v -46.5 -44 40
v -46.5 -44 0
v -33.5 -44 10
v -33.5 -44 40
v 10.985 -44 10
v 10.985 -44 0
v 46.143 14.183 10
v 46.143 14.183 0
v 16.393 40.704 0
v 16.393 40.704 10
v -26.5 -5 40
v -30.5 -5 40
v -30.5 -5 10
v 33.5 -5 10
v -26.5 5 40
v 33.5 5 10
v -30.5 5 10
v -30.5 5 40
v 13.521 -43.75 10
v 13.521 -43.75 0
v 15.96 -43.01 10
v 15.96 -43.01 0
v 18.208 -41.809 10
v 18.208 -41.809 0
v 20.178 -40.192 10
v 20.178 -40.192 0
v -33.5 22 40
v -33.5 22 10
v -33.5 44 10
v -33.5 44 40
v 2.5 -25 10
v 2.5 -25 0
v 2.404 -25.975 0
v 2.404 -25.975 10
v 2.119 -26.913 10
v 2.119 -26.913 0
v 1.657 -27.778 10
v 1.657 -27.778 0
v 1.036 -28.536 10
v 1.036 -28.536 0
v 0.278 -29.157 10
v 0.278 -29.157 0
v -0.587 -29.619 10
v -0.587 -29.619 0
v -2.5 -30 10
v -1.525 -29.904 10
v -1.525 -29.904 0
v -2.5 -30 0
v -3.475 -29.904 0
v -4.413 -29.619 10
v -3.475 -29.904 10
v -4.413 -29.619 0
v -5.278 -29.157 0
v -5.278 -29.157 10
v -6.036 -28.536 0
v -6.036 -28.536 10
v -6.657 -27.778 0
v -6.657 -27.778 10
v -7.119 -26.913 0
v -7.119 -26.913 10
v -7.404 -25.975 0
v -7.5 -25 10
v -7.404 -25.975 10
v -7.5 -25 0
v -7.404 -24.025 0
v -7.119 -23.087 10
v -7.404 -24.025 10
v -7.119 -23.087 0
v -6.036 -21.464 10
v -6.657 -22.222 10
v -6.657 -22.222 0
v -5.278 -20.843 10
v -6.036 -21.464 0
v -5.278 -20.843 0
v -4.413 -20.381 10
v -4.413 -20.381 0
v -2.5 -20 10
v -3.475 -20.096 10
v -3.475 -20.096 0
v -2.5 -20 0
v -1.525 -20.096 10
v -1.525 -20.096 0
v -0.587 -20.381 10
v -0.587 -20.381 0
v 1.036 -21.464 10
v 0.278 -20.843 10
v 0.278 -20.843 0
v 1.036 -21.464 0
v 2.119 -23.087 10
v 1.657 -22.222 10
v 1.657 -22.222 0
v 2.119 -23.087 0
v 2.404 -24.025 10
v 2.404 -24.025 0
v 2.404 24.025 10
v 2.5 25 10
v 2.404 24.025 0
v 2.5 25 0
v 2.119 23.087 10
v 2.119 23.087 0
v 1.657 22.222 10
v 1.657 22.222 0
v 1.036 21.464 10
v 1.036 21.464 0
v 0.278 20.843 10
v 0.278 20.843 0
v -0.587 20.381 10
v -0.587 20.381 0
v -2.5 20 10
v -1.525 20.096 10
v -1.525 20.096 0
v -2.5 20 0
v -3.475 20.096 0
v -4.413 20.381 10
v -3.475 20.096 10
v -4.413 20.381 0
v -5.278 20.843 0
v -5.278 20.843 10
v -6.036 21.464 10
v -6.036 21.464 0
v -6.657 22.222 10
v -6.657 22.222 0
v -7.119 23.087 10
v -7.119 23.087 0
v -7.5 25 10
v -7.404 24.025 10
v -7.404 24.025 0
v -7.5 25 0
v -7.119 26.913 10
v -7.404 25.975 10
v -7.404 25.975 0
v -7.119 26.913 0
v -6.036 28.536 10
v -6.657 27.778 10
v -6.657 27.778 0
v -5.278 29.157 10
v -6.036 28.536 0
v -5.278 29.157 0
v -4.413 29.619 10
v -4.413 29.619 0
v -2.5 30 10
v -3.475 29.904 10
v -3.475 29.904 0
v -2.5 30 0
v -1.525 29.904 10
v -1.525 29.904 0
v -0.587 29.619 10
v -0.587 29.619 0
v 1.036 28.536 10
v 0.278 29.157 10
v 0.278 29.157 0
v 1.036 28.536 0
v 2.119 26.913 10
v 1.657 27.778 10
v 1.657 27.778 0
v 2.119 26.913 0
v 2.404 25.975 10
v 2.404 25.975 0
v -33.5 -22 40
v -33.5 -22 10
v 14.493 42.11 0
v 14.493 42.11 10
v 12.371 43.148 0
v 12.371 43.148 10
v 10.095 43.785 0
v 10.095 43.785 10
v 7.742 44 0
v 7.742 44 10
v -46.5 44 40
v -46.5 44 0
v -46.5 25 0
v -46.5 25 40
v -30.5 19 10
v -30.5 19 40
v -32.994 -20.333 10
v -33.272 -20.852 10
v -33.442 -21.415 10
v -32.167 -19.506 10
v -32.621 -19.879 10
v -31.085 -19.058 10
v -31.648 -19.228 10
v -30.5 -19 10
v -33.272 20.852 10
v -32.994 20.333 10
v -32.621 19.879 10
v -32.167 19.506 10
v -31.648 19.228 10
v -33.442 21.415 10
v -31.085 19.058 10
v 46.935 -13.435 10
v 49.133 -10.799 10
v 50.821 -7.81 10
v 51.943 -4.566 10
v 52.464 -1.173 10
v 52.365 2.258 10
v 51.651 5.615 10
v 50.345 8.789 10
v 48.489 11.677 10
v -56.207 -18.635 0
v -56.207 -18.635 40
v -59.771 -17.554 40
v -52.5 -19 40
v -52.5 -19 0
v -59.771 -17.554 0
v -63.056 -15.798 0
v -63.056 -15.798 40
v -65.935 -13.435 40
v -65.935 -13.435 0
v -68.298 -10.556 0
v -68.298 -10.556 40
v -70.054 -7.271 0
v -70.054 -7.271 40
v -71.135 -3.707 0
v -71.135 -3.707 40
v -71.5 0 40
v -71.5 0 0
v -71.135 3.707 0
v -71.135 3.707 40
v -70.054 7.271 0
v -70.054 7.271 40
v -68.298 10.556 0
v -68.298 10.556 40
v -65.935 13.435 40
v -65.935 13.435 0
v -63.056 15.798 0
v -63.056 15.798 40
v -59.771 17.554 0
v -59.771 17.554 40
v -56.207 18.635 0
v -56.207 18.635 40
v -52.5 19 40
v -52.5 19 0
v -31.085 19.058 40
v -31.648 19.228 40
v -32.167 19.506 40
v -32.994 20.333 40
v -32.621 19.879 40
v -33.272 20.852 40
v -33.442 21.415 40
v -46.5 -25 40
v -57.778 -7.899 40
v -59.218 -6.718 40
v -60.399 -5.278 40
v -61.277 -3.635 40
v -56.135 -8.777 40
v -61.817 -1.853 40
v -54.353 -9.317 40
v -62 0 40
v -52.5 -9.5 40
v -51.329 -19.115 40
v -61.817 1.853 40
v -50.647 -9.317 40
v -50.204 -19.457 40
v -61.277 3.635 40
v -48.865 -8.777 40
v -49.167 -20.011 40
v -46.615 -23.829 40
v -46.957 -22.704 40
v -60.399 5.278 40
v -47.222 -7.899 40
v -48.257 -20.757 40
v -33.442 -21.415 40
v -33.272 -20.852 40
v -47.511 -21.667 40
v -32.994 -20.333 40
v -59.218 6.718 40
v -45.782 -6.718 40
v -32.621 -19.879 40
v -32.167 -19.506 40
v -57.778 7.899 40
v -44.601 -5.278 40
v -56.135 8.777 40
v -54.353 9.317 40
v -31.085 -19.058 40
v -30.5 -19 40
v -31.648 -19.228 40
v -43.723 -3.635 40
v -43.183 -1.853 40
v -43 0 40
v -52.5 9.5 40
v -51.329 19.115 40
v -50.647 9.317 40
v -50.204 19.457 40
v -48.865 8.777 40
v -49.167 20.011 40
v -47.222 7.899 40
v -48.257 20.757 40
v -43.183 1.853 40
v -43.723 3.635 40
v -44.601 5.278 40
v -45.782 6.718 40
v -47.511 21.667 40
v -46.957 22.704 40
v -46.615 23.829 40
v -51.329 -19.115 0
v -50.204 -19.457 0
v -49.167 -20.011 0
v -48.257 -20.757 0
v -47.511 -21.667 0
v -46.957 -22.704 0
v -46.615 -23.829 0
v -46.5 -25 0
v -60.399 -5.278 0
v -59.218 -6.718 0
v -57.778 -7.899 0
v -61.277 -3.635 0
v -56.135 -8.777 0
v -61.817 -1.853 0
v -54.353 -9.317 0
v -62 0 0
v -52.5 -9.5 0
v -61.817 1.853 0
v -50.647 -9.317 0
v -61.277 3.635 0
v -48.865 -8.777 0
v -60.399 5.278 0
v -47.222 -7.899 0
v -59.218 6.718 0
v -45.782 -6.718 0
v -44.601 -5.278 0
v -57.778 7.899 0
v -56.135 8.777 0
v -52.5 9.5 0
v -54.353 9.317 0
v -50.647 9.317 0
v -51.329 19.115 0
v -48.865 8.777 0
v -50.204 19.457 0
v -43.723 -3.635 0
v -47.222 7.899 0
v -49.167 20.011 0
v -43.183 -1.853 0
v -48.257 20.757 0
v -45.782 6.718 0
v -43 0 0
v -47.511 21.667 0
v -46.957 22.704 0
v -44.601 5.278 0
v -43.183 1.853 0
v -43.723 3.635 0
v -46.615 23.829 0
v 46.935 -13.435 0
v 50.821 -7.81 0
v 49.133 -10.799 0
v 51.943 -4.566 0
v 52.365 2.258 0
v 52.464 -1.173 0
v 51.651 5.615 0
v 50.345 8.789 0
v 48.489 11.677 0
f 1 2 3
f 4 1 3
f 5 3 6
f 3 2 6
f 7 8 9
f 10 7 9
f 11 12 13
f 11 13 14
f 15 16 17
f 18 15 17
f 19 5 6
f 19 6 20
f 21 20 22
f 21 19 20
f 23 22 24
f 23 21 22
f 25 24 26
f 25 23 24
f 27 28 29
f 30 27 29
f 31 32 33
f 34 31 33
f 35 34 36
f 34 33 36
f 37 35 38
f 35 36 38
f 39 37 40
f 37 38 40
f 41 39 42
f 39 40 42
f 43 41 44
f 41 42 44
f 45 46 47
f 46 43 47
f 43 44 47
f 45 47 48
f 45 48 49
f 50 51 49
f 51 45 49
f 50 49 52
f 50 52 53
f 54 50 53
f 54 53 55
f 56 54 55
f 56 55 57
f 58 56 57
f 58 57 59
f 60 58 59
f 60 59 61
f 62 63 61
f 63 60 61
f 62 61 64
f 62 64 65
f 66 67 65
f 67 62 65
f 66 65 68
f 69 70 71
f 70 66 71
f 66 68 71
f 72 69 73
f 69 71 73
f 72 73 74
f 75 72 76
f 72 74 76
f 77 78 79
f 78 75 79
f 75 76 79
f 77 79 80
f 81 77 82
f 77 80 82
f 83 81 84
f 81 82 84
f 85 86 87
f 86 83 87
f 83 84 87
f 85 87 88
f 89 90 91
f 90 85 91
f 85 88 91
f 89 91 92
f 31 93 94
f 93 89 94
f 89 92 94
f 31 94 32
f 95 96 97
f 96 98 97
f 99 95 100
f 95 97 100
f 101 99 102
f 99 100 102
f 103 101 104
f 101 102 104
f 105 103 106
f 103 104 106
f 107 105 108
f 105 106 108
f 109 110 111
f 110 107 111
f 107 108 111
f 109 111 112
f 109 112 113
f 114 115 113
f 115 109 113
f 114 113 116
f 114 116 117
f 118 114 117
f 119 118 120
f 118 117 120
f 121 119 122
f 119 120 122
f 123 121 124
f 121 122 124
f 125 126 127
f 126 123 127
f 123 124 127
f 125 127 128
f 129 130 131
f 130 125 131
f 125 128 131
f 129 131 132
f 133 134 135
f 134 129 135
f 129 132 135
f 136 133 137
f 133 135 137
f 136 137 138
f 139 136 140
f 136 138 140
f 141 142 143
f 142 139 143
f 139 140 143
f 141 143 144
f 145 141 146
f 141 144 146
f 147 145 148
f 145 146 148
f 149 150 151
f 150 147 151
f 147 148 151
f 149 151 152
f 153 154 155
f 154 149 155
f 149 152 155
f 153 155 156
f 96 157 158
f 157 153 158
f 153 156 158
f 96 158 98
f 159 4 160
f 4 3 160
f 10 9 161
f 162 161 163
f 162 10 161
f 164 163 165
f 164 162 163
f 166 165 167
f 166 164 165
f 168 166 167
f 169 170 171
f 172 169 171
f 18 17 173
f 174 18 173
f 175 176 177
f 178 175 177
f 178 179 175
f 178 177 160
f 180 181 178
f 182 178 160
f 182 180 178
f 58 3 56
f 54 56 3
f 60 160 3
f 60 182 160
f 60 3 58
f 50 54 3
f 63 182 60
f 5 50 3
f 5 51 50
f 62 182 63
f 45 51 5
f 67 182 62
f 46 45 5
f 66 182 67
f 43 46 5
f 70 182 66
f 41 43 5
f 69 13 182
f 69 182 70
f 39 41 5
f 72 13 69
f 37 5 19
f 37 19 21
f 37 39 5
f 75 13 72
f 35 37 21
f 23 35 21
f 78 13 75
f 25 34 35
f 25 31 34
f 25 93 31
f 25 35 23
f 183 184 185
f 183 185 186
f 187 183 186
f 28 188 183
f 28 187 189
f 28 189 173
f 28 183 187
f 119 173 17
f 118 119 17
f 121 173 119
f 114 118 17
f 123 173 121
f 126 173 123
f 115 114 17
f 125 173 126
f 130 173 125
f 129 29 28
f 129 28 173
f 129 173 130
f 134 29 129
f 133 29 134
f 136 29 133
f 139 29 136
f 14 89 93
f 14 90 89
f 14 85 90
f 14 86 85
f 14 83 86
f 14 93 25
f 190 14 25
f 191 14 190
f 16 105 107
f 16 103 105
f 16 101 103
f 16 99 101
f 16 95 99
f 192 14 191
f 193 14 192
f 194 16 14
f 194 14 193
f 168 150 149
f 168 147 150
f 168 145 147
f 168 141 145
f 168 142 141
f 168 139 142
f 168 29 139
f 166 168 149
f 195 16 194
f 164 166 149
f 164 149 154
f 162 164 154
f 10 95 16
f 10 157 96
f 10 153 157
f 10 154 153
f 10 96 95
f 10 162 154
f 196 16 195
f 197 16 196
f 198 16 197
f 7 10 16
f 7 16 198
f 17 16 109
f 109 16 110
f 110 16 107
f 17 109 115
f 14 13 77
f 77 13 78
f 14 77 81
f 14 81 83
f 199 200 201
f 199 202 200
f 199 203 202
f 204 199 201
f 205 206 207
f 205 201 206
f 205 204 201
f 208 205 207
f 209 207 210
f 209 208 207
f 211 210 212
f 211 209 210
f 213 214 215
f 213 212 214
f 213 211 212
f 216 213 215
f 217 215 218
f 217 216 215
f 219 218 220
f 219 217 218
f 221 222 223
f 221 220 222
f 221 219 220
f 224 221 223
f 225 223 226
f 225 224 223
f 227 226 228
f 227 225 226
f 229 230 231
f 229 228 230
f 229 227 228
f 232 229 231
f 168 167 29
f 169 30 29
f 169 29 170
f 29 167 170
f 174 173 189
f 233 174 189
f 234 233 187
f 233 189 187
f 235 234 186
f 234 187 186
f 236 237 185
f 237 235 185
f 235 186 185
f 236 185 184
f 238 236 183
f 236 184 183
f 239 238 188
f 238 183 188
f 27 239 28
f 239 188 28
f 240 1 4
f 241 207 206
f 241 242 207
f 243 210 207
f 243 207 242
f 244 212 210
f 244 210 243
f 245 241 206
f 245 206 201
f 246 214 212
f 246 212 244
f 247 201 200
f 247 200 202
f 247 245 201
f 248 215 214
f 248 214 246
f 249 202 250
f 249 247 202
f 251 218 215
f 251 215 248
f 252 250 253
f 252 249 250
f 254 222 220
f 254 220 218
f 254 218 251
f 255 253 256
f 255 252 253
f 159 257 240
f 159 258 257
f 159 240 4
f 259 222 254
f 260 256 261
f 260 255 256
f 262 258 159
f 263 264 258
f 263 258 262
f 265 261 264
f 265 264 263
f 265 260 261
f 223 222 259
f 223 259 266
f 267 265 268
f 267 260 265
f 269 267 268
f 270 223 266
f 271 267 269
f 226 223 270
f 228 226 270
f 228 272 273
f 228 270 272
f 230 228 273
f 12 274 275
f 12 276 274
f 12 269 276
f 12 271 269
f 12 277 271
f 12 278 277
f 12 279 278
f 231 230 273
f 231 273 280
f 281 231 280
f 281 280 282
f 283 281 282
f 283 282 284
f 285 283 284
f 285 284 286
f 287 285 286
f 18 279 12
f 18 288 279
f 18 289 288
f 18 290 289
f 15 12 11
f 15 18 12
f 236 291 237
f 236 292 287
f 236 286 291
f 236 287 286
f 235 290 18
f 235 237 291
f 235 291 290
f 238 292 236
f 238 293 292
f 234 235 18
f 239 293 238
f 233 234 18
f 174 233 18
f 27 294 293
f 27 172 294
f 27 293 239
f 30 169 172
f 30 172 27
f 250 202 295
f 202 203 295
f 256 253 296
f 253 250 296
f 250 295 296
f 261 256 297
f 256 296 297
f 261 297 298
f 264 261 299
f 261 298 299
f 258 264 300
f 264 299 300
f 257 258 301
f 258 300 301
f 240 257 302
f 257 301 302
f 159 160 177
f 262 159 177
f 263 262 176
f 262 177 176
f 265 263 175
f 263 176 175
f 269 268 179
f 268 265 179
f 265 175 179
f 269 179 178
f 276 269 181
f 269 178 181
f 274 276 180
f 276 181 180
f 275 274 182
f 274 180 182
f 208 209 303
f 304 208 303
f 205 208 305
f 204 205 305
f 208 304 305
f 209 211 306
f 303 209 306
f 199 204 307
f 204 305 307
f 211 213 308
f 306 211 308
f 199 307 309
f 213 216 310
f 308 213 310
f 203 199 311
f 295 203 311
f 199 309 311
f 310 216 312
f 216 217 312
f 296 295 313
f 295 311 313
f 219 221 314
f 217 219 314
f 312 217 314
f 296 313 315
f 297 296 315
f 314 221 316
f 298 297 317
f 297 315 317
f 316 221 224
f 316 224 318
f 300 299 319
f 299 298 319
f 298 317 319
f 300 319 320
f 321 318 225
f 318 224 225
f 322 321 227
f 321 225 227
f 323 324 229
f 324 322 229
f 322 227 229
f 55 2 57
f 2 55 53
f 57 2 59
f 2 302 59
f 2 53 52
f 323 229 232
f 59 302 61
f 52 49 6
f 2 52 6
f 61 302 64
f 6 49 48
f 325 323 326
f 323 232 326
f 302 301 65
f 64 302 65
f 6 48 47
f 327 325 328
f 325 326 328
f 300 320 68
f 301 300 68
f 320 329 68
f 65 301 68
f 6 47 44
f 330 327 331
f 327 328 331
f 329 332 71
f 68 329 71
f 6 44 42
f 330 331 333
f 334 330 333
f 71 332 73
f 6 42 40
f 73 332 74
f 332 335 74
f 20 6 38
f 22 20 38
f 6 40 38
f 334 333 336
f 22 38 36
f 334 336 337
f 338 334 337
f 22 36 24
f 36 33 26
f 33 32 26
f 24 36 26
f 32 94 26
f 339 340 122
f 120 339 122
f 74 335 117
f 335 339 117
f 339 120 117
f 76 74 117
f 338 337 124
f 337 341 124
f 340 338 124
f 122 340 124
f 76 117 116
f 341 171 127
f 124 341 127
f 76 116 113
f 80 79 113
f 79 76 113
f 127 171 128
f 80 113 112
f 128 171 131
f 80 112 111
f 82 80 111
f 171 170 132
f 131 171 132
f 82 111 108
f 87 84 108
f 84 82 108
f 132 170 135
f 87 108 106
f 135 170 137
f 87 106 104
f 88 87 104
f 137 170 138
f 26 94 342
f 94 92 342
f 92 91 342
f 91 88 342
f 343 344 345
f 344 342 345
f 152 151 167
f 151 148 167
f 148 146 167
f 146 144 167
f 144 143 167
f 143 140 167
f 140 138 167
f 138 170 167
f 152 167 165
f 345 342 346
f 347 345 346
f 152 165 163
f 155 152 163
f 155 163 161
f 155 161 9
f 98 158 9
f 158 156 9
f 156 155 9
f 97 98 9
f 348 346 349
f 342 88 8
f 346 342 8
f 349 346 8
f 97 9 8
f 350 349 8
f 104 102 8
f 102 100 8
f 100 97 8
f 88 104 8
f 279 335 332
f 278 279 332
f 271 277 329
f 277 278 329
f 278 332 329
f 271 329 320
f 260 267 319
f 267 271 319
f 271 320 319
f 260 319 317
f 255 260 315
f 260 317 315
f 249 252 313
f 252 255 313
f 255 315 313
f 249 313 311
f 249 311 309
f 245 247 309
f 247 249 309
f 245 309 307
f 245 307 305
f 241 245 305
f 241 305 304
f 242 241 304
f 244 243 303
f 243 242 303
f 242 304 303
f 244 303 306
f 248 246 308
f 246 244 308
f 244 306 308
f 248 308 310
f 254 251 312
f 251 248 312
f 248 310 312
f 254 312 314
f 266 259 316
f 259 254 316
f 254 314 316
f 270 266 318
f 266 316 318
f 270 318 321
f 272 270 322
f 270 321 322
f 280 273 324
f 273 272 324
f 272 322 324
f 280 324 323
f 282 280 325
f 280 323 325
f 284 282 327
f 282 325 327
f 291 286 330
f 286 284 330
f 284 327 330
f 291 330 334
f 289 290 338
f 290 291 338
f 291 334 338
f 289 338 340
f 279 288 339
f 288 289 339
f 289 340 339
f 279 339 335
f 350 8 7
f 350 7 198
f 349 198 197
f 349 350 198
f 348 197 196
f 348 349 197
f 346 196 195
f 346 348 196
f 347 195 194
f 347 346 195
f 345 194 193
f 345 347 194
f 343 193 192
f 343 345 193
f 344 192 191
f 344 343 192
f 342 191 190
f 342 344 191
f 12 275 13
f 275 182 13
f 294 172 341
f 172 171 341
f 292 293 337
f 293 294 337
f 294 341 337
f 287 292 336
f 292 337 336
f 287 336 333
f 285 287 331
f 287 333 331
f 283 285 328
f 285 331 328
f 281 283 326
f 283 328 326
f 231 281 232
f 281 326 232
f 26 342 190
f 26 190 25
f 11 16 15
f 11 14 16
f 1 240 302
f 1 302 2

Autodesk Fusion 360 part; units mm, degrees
sketch "Sketch1" plane through (0, 0, 0) normal (0, 0, 1) x (1, 0, 0)
  line L0 (16.3701, -44) -> (-33.5, -44)
  line L1 (-33.5, 44) -> (12.6952, 44)
  line L2 (-26.5, 5) -> (-30.5, 5) construction
  line L3 (-30.5, -5) -> (-26.5, -5) construction
  circle A0 centre (-2.5, 25) radius 5
  circle A1 centre (-2.5, -25) radius 5
  line L4 (46.935, 13.435) -> (46.9571, 13.4571)
  line L5 (46.935, -13.435) -> (16.3701, -44)
  line L6 (46.9571, 13.4571) -> (12.6952, 44)
  line L7 (-33.5, 44) -> (-46.5, 44)
  line L8 (-46.5, -44) -> (-33.5, -44)
  circle A2 centre (-52.5, 0) radius 9.5
  arc A3 (-52.5, 19) -> (-46.5, 25) centre (-52.5, 25) ccw
  arc A4 (-46.5, -25) -> (-52.5, -19) centre (-52.5, -25) ccw
  line L9 (-46.5, 25) -> (-46.5, 44) construction
  line L10 (-46.5, 44) -> (-46.5, 25)
  arc A5 (-52.5, 19) -> (-52.5, -19) centre (-52.5, 0) ccw
  line L11 (-46.5, -44) -> (-46.5, -25) construction
  line L12 (-46.5, -25) -> (-46.5, -44)
  line L13 (-33.5, -44) -> (-26.5, -44) construction
  arc A6 (-30.5, -19) -> (-33.5, -22) centre (-30.5, -22) ccw
  arc A7 (-33.5, 22) -> (-30.5, 19) centre (-30.5, 22) ccw
  line L14 (-33.5, -22) -> (-33.5, -44) construction
  line L15 (-33.5, 44) -> (-33.5, 22) construction
  line L16 (-33.5, 22) -> (-33.5, 44)
  line L17 (-33.5, 22) -> (-33.5, 44)
  line L18 (-33.5, -44) -> (-33.5, -22)
  line L19 (-33.5, -44) -> (-33.5, -22)
  arc A8 (46.935, -13.435) -> (46.1432, 14.1827) centre (33.5, 0) ccw
  line L20 (-30.5, -19) -> (-30.5, -5)
  line L21 (-30.5, 5) -> (-30.5, 19)
  line L22 (-30.5, -5) -> (-26.5, -5)
  line L23 (-26.5, -5) -> (-26.5, 5)
  line L24 (-26.5, 5) -> (-30.5, 5)
  dimension "d2" = 88
  dimension "d4" = 10
  dimension "d5" = 39
  dimension "d8" = 10
  dimension "d9" = 10
  dimension "d10" = 38
  dimension "d13" = 13
  dimension "d17" = 19
  dimension "d18" = 38
  dimension "d20" = 12
  dimension "d21" = 12
  dimension "d22" = 7
  dimension "d25" = 6
  dimension "d26" = 6
  dimension "d27" = 4
extrude "Extrude1" add sketch "Sketch1" along normal blind 40 contours L7 L8 A3 A4 L10 A5 L12 A6 A7 L16 L17 L18 L19 L20 L21 L22 L23 L24
extrude "Extrude2" add sketch "Sketch1" along normal blind 10 contours L0 L1 L5 L6 A6 A7 L16 L17 L18 L19 A8 L20 L21 L22 L23 L24
sketch "Sketch2" plane through (0, 0, 0) normal (0, 1, 0) x (1, 0, 0)
  line L0 (-26.5, -40) -> (-26.5, -10)
  line L1 (-26.5, -10) -> (33.5, -10)
  line L2 (33.5, -10) -> (-26.5, -40)
  dimension "d32" = 60
extrude "Extrude3" add sketch "Sketch2" along normal mid plane 10
fillet "Fillet1" radius 13 1 edges at (16.3701, -44, 5)
fillet "Fillet2" radius 13 1 edges at (12.6952, 44, 5)
equation "d5 = ( ( 88 - 10 ) / 2 ) * 1 mm"
equation "d10 = ( 19 * 2 ) * 1 mm"
